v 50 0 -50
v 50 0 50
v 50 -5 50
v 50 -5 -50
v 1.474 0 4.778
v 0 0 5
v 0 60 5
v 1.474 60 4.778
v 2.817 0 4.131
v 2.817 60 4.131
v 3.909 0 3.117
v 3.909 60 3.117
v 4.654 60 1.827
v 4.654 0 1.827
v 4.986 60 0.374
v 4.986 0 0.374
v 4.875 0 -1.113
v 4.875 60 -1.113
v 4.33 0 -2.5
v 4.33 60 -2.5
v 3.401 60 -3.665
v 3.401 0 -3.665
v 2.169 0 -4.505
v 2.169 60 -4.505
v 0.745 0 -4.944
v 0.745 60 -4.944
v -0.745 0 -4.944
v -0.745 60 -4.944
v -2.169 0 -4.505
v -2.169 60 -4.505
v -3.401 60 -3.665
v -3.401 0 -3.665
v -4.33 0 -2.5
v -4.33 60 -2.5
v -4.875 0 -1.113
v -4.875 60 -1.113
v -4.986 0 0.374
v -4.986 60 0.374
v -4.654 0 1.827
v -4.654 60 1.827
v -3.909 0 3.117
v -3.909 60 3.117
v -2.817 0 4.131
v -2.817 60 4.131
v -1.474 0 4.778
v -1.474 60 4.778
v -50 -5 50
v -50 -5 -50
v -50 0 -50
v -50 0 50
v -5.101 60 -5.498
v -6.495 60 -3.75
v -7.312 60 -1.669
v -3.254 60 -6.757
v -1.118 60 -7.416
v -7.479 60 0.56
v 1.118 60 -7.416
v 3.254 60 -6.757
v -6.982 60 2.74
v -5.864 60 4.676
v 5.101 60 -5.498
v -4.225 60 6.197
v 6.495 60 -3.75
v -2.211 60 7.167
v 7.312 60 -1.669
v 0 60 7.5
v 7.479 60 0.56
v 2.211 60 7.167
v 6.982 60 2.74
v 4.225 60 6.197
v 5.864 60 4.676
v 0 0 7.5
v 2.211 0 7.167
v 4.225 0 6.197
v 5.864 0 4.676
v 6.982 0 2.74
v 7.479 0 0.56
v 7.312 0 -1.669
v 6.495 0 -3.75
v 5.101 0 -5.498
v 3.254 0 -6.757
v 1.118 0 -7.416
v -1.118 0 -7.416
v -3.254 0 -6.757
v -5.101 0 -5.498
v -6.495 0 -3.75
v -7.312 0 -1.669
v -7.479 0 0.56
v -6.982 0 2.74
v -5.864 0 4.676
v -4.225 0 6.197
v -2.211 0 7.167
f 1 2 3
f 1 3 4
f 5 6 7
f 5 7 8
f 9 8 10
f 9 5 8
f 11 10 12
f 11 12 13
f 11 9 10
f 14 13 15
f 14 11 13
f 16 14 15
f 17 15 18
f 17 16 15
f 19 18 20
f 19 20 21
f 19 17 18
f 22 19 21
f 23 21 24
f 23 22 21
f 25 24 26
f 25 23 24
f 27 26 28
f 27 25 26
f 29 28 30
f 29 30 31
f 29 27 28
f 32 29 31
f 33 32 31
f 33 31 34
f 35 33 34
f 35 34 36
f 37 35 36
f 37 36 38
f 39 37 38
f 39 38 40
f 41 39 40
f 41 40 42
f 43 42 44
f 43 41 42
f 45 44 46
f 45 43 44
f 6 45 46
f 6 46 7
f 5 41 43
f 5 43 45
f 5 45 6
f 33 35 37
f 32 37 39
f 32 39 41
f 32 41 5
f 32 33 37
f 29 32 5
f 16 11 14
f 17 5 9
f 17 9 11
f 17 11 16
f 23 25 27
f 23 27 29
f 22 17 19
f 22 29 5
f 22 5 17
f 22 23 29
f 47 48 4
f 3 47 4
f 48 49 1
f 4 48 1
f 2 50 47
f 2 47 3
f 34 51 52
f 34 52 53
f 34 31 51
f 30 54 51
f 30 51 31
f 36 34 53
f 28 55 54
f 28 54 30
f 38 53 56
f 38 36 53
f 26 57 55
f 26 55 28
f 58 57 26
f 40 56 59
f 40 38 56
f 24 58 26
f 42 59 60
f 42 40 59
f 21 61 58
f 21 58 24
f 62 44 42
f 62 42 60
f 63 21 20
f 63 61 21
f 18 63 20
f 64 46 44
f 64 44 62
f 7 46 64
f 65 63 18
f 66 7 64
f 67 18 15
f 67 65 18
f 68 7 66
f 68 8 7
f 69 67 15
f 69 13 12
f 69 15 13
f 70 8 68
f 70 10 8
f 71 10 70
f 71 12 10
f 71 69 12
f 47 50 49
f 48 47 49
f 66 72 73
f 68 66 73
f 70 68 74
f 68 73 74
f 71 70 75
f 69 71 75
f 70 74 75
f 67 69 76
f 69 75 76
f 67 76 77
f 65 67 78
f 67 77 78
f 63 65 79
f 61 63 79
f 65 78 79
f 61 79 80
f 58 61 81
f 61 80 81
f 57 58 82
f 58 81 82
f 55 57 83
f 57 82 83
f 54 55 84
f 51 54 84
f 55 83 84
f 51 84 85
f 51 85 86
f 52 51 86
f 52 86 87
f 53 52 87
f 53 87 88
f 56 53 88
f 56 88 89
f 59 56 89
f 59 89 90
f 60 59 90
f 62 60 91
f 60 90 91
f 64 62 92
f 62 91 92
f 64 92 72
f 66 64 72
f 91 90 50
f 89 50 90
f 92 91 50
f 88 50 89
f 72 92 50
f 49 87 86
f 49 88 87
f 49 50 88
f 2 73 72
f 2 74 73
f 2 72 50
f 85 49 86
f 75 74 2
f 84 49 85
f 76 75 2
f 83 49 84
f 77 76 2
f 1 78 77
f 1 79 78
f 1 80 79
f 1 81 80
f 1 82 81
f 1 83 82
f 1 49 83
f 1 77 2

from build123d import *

# Parameters (mm, degrees)
ESBO_O1_W                = 100
ESBO_O1_H                = 100
RESSALTO_EXTRUS_O1_DEPTH = 5
ESBO_O2_R                = 7.5
ESBO_O2_R_2              = 5
RESSALTO_EXTRUS_O2_DEPTH = 60


with BuildPart() as part:
    # Esboço1 → Ressalto-extrusão1 (new body)
    with BuildSketch(Plane(origin=(0, 0, 0), x_dir=(1, 0, 0), z_dir=(0, 1, 0))):
        Rectangle(ESBO_O1_W, ESBO_O1_H)
    extrude(amount=-RESSALTO_EXTRUS_O1_DEPTH)

    # Esboço2 → Ressalto-extrusão2 (add)
    with BuildSketch(Plane(origin=(0, 0, 0), x_dir=(1, 0, 0), z_dir=(0, 1, 0))):
        with Locations(Location((0, 0, 0), (0, 0, 270))):
            Circle(ESBO_O2_R)
        with Locations(Location((0, 0, 0), (0, 0, 270))):
            Circle(ESBO_O2_R_2, mode=Mode.SUBTRACT)
    extrude(amount=RESSALTO_EXTRUS_O2_DEPTH)


solid = part.part
